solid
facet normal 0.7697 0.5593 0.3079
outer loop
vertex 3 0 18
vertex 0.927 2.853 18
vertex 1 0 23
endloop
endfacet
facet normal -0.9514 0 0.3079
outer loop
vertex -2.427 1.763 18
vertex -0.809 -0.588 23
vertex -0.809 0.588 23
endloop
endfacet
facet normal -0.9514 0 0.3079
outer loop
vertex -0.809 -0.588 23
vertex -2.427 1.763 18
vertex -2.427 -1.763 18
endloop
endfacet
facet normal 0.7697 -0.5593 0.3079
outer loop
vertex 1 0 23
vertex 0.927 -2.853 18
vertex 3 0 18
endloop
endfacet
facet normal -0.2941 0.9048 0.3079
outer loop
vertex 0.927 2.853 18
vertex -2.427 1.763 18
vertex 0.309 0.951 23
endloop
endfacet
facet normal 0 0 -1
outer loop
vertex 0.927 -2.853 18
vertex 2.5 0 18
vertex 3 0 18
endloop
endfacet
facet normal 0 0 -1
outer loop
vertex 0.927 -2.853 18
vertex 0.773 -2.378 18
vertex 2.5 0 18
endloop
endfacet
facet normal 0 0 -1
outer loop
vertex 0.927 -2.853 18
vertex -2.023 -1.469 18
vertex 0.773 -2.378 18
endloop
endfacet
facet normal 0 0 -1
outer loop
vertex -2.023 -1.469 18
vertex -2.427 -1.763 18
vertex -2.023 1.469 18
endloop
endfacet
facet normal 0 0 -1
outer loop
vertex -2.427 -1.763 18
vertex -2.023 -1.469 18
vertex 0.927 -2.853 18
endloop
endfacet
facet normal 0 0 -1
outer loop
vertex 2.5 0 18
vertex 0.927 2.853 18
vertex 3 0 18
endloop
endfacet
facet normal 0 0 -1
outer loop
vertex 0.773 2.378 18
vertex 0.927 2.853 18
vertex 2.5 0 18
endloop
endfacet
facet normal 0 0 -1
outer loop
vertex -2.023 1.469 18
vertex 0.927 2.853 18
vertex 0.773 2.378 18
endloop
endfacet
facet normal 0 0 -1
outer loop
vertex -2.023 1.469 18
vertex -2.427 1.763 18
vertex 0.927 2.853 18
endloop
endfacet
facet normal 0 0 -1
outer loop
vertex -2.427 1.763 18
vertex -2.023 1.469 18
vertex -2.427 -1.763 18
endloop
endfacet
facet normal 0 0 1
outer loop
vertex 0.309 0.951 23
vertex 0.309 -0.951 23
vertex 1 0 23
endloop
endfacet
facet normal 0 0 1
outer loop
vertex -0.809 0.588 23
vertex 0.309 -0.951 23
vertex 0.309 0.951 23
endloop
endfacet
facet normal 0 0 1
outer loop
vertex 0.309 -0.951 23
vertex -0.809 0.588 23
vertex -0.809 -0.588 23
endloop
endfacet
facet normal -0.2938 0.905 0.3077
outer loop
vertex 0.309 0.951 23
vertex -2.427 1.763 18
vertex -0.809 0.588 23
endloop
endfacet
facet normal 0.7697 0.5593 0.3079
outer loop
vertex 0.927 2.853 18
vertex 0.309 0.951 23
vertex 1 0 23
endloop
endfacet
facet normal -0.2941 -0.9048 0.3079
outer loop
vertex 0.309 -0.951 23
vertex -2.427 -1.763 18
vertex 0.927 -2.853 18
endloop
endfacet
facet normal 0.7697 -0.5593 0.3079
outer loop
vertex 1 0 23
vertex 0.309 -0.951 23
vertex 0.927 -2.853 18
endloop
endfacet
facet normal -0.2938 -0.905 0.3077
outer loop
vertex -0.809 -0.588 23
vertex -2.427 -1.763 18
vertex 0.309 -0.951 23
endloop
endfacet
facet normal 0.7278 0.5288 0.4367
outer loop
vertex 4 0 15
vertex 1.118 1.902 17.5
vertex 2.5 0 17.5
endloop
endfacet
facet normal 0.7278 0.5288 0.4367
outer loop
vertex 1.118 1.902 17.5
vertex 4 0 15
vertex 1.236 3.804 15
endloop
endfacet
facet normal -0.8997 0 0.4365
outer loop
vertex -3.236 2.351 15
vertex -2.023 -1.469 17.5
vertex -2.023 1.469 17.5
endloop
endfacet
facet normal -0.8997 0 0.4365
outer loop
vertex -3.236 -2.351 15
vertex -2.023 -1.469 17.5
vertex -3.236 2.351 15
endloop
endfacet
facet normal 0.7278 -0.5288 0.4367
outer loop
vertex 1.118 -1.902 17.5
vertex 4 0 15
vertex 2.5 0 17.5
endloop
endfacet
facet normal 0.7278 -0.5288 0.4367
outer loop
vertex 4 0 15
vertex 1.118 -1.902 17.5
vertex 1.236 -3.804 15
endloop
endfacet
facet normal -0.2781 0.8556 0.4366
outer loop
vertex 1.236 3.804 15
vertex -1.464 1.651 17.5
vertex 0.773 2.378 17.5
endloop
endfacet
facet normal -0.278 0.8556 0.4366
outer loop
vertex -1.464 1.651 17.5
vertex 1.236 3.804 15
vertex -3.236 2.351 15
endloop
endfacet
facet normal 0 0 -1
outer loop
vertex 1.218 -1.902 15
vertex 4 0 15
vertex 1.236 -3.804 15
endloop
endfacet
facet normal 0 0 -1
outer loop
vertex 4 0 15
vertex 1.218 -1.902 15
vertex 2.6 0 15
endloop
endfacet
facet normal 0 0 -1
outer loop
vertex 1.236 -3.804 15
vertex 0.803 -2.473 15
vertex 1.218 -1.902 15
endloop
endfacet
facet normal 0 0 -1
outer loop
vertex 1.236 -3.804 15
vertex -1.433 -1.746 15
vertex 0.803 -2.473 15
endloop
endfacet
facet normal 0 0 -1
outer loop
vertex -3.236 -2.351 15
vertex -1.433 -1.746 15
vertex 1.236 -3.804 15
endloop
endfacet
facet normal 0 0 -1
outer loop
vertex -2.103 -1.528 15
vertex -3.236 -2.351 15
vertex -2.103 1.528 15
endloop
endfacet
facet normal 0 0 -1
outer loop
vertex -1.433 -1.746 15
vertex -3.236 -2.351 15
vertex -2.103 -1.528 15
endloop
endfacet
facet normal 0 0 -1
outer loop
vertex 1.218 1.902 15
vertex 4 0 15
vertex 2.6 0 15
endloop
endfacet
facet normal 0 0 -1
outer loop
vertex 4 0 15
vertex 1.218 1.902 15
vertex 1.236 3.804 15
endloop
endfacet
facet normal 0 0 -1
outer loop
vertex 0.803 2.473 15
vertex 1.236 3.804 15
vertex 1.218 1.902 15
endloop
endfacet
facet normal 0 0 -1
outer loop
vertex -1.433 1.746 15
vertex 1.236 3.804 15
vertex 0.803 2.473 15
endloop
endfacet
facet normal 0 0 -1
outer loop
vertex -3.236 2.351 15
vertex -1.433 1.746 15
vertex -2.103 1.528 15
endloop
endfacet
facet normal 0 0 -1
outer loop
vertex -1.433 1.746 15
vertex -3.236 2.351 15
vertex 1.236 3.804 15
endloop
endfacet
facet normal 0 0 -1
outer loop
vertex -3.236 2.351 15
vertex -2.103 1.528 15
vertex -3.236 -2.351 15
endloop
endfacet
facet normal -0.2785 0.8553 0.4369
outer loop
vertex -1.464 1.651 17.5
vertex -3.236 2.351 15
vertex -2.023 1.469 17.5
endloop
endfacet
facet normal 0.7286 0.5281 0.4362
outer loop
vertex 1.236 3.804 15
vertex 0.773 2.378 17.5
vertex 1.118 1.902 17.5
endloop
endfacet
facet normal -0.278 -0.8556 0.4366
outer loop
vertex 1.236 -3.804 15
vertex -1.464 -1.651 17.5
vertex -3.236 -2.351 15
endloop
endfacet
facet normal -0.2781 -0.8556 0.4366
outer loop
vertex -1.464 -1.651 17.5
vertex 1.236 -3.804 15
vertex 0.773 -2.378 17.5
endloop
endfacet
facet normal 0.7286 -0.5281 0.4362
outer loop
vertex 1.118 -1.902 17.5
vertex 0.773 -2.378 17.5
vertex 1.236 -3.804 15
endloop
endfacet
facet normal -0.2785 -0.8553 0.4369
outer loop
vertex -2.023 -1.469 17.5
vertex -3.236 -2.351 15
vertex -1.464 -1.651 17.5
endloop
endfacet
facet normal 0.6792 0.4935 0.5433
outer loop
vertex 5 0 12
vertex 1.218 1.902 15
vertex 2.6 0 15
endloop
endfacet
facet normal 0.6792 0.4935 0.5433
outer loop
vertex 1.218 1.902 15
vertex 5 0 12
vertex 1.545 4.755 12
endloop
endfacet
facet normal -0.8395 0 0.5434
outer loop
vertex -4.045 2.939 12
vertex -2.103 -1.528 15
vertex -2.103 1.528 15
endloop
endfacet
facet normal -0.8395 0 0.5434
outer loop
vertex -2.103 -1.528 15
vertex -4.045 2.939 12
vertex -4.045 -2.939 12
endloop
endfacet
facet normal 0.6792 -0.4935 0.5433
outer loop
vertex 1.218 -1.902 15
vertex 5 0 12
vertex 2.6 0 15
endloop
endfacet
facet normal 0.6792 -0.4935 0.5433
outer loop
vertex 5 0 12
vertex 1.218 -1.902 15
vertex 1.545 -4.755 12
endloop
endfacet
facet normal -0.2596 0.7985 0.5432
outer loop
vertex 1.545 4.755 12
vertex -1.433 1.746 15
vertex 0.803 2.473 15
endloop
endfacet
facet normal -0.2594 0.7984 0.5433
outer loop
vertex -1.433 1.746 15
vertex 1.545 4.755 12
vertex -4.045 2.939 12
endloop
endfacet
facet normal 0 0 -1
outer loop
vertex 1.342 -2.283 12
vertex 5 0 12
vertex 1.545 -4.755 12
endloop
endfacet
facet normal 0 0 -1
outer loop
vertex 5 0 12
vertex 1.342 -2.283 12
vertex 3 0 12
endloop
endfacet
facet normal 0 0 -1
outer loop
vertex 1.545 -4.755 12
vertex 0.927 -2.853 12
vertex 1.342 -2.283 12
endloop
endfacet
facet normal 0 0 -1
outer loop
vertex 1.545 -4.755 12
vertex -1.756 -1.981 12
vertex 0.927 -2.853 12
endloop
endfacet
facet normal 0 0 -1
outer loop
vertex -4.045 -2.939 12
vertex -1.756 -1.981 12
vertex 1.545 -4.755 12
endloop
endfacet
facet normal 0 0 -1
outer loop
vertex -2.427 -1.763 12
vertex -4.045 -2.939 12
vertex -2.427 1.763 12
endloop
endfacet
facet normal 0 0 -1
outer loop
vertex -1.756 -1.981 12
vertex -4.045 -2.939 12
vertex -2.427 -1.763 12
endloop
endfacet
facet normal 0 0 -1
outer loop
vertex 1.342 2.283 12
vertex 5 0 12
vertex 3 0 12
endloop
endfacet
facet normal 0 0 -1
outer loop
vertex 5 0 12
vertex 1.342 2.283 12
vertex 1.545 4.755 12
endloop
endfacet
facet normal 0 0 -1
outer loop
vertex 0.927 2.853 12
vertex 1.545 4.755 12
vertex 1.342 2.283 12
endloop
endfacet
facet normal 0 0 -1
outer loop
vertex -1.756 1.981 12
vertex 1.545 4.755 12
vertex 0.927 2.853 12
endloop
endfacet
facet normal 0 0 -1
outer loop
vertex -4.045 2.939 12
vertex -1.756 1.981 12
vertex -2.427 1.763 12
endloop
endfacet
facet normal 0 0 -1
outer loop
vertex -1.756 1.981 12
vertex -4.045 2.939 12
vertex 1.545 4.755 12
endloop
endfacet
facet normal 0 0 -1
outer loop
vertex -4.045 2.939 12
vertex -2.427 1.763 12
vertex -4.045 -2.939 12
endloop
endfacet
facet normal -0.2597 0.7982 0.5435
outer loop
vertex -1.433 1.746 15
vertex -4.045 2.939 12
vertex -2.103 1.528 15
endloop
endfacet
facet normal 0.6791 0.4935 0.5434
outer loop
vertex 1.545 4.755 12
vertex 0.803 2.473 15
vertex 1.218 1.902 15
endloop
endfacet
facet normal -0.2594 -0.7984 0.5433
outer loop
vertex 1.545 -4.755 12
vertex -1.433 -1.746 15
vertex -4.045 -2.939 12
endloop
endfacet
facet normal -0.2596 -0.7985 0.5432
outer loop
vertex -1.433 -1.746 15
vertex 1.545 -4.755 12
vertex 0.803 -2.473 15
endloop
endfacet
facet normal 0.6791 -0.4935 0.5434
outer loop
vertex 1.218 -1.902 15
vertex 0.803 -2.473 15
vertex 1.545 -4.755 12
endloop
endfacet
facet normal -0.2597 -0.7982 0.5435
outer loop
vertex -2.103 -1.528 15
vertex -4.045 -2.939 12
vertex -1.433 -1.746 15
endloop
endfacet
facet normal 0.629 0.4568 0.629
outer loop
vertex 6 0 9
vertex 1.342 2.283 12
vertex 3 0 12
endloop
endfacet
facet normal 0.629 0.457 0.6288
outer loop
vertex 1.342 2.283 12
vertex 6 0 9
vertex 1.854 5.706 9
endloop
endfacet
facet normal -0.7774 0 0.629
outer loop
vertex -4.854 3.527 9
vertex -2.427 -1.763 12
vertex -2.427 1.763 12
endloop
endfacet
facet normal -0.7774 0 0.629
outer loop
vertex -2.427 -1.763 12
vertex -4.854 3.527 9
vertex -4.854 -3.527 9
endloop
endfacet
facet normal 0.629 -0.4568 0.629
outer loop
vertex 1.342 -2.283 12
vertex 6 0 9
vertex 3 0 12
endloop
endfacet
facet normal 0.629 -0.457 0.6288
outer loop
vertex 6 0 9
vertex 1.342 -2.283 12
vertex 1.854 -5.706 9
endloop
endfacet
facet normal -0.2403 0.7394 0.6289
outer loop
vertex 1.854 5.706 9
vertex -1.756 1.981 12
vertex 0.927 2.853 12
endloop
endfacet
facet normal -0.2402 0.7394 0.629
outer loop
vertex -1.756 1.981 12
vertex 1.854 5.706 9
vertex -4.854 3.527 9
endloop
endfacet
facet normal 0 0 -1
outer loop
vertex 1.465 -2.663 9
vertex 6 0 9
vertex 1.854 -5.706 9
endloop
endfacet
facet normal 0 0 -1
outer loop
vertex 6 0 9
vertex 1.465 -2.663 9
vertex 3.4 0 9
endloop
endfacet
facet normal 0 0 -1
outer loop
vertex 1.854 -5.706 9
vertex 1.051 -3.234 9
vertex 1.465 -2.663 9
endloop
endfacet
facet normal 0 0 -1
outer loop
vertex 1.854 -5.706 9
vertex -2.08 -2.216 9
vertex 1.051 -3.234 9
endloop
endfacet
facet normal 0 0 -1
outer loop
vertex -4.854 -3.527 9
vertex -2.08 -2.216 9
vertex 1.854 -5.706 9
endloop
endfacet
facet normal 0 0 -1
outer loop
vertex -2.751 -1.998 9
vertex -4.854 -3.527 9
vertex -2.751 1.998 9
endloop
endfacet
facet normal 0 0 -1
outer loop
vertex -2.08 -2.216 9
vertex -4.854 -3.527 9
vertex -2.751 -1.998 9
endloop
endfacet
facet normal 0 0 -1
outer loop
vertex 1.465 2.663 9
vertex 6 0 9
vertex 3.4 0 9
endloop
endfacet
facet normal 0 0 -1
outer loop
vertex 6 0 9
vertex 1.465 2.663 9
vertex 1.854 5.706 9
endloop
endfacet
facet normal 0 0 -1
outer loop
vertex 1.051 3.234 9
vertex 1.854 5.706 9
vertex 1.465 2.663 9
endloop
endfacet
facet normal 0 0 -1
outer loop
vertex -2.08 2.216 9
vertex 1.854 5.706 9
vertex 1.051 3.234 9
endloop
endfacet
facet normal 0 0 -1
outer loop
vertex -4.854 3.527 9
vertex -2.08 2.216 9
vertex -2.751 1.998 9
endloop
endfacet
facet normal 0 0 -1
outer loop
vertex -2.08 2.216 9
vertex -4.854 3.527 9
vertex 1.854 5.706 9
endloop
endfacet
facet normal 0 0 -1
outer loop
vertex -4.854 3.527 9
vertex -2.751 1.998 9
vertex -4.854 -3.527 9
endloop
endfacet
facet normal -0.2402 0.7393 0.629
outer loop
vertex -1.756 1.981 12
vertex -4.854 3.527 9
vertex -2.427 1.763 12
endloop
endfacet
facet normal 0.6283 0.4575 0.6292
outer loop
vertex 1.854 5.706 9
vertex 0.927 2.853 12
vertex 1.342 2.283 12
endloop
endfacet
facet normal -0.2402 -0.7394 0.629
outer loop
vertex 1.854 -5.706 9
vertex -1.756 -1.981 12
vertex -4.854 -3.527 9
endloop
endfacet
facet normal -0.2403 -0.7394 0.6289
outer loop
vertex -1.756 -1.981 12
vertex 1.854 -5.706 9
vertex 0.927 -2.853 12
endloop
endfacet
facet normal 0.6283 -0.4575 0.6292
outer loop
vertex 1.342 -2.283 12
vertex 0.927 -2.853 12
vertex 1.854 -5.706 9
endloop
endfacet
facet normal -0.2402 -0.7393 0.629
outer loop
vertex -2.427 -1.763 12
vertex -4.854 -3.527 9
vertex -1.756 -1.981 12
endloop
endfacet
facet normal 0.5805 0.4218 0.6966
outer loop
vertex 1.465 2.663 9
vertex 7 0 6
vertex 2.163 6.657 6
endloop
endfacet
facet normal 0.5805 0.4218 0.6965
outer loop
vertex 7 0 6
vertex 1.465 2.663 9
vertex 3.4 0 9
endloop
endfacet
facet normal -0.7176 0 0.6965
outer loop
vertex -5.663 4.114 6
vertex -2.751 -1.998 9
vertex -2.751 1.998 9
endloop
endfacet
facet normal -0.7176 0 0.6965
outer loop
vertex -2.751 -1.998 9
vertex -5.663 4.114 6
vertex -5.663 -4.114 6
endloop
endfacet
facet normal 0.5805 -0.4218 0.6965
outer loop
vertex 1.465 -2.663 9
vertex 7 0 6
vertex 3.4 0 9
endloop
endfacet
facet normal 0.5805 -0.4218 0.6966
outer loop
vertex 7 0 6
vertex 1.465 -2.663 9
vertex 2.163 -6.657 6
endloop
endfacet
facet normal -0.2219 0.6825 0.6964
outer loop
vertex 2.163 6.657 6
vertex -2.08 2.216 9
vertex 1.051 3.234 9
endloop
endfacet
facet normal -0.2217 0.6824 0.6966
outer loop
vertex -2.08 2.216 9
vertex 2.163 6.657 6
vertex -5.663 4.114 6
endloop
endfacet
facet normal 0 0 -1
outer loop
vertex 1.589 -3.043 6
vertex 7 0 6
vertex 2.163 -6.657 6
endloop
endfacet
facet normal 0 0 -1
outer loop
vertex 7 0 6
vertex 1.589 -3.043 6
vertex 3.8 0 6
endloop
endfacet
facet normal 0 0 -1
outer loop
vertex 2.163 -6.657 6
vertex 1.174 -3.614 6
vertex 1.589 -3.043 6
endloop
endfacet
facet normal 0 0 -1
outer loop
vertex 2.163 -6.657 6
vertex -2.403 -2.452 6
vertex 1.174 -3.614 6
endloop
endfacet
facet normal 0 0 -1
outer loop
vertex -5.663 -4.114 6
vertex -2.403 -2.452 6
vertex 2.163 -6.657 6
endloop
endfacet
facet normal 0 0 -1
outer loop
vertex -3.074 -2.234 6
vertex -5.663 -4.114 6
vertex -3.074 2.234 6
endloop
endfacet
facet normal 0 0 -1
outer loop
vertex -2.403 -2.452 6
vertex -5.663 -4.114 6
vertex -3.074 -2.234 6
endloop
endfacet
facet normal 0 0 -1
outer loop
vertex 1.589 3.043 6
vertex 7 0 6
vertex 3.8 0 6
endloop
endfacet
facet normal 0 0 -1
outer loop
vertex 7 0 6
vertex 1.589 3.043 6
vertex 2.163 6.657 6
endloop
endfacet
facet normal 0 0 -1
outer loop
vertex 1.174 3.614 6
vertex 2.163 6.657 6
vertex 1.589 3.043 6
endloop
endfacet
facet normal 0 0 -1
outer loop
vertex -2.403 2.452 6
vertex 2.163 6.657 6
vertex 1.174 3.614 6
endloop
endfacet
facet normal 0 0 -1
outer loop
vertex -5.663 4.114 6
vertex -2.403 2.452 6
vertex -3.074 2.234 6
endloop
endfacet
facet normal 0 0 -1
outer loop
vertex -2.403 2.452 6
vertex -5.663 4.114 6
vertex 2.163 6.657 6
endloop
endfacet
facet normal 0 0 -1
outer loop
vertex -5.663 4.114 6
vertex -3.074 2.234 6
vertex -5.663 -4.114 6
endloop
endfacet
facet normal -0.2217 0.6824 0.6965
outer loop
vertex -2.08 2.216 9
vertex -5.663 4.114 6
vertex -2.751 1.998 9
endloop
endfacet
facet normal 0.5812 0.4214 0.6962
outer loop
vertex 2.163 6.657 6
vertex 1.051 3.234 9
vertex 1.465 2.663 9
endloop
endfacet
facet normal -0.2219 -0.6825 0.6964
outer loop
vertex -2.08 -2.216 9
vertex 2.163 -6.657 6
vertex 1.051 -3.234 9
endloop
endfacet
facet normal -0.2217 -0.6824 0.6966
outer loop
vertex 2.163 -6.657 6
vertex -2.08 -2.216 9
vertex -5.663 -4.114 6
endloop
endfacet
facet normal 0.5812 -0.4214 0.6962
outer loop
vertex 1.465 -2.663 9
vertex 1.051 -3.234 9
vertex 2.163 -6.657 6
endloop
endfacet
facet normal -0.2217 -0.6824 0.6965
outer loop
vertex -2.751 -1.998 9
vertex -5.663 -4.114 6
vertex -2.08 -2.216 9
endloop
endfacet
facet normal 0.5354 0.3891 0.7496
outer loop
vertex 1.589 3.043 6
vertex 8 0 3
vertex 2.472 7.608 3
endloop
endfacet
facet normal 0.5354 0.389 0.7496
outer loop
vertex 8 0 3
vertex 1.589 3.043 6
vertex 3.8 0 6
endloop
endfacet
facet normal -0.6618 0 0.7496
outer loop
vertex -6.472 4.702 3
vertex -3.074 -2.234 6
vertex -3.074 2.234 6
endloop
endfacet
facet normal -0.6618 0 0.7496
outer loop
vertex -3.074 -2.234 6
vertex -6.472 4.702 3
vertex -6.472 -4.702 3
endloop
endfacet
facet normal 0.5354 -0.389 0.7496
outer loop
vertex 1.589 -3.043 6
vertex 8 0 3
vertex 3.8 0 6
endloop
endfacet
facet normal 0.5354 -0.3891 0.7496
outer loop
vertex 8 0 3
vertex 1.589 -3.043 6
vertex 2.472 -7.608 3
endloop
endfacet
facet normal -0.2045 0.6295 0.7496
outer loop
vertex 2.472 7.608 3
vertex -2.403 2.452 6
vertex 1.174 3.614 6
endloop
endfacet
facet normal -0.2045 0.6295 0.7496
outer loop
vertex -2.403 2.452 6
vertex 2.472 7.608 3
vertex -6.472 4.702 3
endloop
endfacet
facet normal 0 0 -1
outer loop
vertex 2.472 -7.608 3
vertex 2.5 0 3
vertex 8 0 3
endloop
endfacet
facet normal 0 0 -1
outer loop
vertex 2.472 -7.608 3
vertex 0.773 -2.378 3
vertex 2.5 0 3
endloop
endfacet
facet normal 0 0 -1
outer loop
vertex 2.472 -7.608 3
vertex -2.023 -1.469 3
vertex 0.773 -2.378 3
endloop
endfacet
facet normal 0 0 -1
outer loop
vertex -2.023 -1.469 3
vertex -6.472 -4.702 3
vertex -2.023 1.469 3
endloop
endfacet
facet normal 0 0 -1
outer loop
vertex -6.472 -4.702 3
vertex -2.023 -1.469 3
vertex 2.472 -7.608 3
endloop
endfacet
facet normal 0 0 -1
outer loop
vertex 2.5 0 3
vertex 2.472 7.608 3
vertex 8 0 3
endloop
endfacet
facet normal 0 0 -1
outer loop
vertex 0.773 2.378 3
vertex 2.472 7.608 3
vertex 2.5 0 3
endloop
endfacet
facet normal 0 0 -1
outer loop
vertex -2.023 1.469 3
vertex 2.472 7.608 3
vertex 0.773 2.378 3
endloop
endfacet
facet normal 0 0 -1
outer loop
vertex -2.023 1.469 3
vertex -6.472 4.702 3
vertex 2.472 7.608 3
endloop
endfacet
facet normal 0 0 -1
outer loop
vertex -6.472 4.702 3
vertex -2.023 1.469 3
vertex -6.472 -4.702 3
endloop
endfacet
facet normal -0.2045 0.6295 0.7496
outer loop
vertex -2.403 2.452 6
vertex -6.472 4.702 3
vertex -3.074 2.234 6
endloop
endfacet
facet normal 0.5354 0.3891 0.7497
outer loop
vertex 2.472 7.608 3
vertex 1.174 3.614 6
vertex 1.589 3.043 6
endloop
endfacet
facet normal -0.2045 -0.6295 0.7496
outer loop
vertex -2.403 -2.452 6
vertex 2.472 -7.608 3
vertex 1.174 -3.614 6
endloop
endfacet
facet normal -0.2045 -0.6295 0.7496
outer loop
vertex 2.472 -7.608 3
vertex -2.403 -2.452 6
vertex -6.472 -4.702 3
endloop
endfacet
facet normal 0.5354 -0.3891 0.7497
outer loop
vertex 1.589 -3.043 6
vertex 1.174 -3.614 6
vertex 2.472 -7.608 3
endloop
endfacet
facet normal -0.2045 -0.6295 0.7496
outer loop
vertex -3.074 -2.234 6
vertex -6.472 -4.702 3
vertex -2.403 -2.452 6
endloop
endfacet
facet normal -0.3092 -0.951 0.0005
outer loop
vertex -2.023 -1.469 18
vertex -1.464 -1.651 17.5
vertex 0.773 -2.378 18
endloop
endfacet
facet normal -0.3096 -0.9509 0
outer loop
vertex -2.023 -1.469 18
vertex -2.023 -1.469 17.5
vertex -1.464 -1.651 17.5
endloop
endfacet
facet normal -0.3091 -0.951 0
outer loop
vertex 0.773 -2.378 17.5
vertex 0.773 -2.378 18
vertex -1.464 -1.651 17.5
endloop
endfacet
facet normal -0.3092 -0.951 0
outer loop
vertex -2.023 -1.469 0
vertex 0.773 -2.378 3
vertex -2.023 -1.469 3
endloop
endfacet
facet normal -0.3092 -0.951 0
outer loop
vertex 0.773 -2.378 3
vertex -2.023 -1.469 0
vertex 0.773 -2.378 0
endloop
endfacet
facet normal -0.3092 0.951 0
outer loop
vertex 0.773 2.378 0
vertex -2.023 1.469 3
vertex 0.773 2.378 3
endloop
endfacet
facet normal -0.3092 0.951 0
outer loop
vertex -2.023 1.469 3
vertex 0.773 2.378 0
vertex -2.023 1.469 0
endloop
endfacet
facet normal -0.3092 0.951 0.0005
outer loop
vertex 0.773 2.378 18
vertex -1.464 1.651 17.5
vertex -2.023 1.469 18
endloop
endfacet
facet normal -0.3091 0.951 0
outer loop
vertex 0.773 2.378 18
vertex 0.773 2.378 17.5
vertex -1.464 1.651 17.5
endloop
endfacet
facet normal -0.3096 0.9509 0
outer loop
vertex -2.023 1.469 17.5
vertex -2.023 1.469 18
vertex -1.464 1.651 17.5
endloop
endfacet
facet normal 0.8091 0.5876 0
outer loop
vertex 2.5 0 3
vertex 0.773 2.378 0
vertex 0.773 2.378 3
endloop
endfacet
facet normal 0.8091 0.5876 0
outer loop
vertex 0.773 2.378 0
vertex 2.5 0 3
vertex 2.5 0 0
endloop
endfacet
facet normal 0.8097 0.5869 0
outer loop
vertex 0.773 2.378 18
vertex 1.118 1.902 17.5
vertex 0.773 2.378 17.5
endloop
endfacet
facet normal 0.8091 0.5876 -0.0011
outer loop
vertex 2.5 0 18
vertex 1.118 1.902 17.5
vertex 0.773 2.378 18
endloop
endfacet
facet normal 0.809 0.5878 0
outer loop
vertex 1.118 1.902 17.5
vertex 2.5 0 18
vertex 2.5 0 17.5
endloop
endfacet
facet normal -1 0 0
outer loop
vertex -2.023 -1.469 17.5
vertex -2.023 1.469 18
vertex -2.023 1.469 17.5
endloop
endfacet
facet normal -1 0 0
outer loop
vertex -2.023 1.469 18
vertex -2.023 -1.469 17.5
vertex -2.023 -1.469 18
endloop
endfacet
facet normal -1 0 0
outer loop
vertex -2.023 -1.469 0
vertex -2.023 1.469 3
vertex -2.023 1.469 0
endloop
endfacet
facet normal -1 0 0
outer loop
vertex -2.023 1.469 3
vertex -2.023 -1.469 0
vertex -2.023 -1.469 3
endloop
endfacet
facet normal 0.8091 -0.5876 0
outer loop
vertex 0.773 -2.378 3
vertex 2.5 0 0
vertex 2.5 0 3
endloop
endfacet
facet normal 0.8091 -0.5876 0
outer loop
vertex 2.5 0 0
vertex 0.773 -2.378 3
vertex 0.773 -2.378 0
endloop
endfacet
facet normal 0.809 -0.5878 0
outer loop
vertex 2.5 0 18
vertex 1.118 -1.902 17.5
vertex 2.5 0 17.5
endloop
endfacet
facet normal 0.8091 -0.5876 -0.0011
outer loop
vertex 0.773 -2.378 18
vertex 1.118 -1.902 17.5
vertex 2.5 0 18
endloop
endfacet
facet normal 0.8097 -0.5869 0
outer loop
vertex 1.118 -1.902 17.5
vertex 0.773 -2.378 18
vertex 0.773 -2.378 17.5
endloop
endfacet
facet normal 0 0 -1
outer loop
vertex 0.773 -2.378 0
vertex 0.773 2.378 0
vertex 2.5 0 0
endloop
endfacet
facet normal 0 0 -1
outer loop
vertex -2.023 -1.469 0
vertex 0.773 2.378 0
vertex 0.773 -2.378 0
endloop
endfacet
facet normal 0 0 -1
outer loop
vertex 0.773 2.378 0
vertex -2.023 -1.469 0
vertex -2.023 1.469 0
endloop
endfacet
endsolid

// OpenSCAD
//Number of Sides
NumSides = 5; //[3:1:10]
$fn = NumSides;

//This changes the height of the tree
Height = 12; //[10:1:30]

//This changes the spacing of each segment
Spacing = 3; //[1:.5:10]

//Diameter of the trunk
TrunkDiameter = 5; //[2:1:25]

//Height of Segment
CylinderHeight = 5; //[1:1:30]

//Radius of Segments
RadiusValue = 1; //[1:.5:5]
//cylinder(h = 15, r1 = 15, r2 = 1);


for (i = [Height - 3:-1:4]) 
{
    translate([0,0,i*Spacing - (3*Spacing)])
    {
       cylinder(h = CylinderHeight, r1 = (Height-i) * RadiusValue, r2 = 1);
    }
}
cylinder(h = ((Height - 6)*Spacing), d = TrunkDiameter);
